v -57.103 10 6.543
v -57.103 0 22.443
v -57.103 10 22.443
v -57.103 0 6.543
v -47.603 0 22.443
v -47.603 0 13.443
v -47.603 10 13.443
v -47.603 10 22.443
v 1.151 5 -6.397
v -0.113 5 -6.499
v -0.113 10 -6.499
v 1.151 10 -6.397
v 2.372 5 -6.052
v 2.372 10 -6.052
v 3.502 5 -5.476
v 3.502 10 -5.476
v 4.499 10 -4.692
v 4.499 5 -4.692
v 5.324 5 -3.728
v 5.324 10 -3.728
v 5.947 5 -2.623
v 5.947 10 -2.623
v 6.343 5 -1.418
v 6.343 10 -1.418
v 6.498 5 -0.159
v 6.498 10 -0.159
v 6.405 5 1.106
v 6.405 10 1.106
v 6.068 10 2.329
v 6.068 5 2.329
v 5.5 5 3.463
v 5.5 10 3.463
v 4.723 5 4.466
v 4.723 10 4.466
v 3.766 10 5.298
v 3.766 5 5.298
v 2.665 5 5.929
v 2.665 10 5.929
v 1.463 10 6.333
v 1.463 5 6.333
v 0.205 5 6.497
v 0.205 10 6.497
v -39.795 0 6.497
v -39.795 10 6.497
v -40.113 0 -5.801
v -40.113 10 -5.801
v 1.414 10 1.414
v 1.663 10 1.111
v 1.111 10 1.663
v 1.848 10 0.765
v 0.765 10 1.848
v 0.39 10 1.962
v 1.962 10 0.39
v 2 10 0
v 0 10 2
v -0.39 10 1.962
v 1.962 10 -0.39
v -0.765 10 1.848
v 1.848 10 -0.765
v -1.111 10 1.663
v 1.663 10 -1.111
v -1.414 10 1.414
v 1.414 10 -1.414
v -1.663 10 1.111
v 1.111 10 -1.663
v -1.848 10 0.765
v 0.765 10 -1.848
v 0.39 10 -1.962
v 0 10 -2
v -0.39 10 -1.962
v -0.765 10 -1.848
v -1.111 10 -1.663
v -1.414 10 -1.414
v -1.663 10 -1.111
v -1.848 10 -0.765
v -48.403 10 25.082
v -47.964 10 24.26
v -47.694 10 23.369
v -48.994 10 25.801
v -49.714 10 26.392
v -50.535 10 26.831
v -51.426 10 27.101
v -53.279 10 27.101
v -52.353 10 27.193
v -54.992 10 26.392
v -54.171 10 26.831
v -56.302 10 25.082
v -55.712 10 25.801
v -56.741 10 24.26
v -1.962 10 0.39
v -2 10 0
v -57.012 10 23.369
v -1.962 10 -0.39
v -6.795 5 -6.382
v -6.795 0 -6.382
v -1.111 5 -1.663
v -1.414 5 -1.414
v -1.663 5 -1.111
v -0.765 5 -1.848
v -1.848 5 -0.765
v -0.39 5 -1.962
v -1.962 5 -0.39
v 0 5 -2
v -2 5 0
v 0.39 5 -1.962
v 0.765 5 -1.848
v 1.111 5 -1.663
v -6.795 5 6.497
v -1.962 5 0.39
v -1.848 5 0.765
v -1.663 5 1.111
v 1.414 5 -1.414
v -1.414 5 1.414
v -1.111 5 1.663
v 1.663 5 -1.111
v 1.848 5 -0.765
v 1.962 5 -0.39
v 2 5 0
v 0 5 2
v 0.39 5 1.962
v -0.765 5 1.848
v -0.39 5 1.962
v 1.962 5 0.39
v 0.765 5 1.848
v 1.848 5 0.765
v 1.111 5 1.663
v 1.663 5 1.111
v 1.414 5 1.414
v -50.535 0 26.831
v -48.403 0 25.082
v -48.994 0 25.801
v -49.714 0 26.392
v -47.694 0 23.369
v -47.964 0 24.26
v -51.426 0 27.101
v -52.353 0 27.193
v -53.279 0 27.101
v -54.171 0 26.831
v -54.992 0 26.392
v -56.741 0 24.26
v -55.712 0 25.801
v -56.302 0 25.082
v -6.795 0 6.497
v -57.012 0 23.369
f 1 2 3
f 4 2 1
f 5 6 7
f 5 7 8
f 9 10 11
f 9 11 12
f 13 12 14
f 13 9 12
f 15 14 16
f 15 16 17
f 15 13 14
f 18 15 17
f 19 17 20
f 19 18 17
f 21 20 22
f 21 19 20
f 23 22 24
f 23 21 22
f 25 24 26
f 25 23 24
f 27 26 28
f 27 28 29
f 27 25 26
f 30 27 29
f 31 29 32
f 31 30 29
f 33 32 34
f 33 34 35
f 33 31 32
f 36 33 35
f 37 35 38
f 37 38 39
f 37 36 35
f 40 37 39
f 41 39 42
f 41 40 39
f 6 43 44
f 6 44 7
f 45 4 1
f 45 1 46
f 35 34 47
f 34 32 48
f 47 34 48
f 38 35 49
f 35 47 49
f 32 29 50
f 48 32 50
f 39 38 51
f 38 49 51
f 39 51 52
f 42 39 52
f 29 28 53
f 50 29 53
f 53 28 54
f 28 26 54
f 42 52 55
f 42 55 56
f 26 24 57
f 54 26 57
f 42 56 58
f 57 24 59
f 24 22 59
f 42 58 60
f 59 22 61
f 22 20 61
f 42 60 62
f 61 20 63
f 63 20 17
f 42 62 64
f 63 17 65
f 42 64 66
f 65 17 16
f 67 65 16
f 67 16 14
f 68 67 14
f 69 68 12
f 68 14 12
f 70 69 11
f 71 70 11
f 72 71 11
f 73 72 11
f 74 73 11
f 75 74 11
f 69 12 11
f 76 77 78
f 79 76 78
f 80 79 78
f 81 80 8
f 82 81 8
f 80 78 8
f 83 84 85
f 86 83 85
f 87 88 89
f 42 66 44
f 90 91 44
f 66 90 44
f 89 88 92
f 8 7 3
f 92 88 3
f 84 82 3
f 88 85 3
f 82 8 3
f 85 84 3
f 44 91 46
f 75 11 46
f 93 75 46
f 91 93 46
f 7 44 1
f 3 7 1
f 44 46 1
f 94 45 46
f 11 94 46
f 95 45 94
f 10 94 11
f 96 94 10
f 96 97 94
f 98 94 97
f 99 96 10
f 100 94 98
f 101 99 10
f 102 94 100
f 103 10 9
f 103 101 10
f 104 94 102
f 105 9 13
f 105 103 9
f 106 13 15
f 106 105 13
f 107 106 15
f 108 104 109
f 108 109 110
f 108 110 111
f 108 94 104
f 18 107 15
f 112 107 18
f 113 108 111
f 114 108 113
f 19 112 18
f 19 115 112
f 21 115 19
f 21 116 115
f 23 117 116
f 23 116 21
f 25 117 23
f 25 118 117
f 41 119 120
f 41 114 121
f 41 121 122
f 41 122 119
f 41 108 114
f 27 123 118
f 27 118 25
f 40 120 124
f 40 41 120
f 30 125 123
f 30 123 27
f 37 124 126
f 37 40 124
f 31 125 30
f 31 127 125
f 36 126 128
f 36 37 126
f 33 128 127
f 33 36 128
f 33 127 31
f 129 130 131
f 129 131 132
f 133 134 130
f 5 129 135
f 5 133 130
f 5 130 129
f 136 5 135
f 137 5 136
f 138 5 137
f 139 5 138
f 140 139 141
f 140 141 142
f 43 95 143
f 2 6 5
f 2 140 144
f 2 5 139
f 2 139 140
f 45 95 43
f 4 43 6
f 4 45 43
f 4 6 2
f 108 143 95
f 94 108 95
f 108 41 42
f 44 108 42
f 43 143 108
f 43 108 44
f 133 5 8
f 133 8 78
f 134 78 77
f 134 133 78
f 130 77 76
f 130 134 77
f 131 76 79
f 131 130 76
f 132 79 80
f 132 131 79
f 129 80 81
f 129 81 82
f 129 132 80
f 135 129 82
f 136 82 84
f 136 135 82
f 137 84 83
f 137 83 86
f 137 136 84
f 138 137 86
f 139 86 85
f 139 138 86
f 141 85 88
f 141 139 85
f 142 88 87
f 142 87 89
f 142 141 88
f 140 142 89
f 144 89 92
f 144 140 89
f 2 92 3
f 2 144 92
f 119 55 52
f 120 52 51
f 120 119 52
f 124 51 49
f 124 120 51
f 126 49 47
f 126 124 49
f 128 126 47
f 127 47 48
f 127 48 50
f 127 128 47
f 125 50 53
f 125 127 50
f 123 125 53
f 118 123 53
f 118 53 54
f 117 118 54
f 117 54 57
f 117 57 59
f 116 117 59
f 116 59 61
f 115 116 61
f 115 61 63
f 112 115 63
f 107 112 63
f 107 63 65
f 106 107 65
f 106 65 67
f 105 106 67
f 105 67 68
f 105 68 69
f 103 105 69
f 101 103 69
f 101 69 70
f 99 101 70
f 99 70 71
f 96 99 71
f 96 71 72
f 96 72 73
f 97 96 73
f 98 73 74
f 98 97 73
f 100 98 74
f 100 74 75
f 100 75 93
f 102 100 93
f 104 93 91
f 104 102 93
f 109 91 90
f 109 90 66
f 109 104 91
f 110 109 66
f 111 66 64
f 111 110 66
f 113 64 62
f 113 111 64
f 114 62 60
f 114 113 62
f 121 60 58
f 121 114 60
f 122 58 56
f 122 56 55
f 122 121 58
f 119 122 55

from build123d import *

# Parameters (mm, degrees)
CROQUIS1_R              = 2
SALIENTE_EXTRUIR1_DEPTH = 10
CROQUIS3_R              = 2
CORTAR_EXTRUIR1_DEPTH   = 5


with BuildPart() as part:
    # Croquis1 → Saliente-Extruir1 (new body)
    with BuildSketch(Plane(origin=(0, 0, 0), x_dir=(1, 0, 0), z_dir=(0, 1, 0))):
        with BuildLine():
            Line((0.204691251, -6.496776238), (-39.795308749, -6.496776238))
            Line((-39.795308749, -6.496776238), (-47.602797524, -13.442682877))
            Line((-47.602797524, -13.442682877), (-47.602797524, -22.442682877))
            ThreePointArc((-47.602797524, -22.442682877), (-52.352797524, -27.192682877), (-57.102797524, -22.442682877))
            Line((-57.102797524, -22.442682877), (-57.102797524, -6.542682877))
            Line((-57.102797524, -6.542682877), (-40.113440642, 5.800807421))
            Line((-40.113440642, 5.800807421), (-0.113440642, 6.499010019))
            ThreePointArc((-0.113440642, 6.499010019), (6.498053307, 0.159069868), (0.204691251, -6.496776238))
        make_face()
        with Locations(Location((0, 0, 0), (0, 0, 270))):
            Circle(CROQUIS1_R, mode=Mode.SUBTRACT)
    extrude(amount=SALIENTE_EXTRUIR1_DEPTH)

    # Croquis3 → Cortar-Extruir1 (cut)
    with BuildSketch(Plane.XZ):
        with BuildLine():
            Line((0.204691251, 6.496776238), (-6.795308749, 6.496776238))
            Line((-6.795308749, 6.496776238), (-6.795308749, -6.382377577))
            Line((-6.795308749, -6.382377577), (-0.113440642, -6.499010019))
            ThreePointArc((-0.113440642, -6.499010019), (6.498053307, -0.159069868), (0.204691251, 6.496776238))
        make_face()
        with Locations(Location((0, 0, 0), (0, 0, 270))):
            Circle(CROQUIS3_R, mode=Mode.SUBTRACT)
    extrude(amount=-CORTAR_EXTRUIR1_DEPTH, mode=Mode.SUBTRACT)


solid = part.part
